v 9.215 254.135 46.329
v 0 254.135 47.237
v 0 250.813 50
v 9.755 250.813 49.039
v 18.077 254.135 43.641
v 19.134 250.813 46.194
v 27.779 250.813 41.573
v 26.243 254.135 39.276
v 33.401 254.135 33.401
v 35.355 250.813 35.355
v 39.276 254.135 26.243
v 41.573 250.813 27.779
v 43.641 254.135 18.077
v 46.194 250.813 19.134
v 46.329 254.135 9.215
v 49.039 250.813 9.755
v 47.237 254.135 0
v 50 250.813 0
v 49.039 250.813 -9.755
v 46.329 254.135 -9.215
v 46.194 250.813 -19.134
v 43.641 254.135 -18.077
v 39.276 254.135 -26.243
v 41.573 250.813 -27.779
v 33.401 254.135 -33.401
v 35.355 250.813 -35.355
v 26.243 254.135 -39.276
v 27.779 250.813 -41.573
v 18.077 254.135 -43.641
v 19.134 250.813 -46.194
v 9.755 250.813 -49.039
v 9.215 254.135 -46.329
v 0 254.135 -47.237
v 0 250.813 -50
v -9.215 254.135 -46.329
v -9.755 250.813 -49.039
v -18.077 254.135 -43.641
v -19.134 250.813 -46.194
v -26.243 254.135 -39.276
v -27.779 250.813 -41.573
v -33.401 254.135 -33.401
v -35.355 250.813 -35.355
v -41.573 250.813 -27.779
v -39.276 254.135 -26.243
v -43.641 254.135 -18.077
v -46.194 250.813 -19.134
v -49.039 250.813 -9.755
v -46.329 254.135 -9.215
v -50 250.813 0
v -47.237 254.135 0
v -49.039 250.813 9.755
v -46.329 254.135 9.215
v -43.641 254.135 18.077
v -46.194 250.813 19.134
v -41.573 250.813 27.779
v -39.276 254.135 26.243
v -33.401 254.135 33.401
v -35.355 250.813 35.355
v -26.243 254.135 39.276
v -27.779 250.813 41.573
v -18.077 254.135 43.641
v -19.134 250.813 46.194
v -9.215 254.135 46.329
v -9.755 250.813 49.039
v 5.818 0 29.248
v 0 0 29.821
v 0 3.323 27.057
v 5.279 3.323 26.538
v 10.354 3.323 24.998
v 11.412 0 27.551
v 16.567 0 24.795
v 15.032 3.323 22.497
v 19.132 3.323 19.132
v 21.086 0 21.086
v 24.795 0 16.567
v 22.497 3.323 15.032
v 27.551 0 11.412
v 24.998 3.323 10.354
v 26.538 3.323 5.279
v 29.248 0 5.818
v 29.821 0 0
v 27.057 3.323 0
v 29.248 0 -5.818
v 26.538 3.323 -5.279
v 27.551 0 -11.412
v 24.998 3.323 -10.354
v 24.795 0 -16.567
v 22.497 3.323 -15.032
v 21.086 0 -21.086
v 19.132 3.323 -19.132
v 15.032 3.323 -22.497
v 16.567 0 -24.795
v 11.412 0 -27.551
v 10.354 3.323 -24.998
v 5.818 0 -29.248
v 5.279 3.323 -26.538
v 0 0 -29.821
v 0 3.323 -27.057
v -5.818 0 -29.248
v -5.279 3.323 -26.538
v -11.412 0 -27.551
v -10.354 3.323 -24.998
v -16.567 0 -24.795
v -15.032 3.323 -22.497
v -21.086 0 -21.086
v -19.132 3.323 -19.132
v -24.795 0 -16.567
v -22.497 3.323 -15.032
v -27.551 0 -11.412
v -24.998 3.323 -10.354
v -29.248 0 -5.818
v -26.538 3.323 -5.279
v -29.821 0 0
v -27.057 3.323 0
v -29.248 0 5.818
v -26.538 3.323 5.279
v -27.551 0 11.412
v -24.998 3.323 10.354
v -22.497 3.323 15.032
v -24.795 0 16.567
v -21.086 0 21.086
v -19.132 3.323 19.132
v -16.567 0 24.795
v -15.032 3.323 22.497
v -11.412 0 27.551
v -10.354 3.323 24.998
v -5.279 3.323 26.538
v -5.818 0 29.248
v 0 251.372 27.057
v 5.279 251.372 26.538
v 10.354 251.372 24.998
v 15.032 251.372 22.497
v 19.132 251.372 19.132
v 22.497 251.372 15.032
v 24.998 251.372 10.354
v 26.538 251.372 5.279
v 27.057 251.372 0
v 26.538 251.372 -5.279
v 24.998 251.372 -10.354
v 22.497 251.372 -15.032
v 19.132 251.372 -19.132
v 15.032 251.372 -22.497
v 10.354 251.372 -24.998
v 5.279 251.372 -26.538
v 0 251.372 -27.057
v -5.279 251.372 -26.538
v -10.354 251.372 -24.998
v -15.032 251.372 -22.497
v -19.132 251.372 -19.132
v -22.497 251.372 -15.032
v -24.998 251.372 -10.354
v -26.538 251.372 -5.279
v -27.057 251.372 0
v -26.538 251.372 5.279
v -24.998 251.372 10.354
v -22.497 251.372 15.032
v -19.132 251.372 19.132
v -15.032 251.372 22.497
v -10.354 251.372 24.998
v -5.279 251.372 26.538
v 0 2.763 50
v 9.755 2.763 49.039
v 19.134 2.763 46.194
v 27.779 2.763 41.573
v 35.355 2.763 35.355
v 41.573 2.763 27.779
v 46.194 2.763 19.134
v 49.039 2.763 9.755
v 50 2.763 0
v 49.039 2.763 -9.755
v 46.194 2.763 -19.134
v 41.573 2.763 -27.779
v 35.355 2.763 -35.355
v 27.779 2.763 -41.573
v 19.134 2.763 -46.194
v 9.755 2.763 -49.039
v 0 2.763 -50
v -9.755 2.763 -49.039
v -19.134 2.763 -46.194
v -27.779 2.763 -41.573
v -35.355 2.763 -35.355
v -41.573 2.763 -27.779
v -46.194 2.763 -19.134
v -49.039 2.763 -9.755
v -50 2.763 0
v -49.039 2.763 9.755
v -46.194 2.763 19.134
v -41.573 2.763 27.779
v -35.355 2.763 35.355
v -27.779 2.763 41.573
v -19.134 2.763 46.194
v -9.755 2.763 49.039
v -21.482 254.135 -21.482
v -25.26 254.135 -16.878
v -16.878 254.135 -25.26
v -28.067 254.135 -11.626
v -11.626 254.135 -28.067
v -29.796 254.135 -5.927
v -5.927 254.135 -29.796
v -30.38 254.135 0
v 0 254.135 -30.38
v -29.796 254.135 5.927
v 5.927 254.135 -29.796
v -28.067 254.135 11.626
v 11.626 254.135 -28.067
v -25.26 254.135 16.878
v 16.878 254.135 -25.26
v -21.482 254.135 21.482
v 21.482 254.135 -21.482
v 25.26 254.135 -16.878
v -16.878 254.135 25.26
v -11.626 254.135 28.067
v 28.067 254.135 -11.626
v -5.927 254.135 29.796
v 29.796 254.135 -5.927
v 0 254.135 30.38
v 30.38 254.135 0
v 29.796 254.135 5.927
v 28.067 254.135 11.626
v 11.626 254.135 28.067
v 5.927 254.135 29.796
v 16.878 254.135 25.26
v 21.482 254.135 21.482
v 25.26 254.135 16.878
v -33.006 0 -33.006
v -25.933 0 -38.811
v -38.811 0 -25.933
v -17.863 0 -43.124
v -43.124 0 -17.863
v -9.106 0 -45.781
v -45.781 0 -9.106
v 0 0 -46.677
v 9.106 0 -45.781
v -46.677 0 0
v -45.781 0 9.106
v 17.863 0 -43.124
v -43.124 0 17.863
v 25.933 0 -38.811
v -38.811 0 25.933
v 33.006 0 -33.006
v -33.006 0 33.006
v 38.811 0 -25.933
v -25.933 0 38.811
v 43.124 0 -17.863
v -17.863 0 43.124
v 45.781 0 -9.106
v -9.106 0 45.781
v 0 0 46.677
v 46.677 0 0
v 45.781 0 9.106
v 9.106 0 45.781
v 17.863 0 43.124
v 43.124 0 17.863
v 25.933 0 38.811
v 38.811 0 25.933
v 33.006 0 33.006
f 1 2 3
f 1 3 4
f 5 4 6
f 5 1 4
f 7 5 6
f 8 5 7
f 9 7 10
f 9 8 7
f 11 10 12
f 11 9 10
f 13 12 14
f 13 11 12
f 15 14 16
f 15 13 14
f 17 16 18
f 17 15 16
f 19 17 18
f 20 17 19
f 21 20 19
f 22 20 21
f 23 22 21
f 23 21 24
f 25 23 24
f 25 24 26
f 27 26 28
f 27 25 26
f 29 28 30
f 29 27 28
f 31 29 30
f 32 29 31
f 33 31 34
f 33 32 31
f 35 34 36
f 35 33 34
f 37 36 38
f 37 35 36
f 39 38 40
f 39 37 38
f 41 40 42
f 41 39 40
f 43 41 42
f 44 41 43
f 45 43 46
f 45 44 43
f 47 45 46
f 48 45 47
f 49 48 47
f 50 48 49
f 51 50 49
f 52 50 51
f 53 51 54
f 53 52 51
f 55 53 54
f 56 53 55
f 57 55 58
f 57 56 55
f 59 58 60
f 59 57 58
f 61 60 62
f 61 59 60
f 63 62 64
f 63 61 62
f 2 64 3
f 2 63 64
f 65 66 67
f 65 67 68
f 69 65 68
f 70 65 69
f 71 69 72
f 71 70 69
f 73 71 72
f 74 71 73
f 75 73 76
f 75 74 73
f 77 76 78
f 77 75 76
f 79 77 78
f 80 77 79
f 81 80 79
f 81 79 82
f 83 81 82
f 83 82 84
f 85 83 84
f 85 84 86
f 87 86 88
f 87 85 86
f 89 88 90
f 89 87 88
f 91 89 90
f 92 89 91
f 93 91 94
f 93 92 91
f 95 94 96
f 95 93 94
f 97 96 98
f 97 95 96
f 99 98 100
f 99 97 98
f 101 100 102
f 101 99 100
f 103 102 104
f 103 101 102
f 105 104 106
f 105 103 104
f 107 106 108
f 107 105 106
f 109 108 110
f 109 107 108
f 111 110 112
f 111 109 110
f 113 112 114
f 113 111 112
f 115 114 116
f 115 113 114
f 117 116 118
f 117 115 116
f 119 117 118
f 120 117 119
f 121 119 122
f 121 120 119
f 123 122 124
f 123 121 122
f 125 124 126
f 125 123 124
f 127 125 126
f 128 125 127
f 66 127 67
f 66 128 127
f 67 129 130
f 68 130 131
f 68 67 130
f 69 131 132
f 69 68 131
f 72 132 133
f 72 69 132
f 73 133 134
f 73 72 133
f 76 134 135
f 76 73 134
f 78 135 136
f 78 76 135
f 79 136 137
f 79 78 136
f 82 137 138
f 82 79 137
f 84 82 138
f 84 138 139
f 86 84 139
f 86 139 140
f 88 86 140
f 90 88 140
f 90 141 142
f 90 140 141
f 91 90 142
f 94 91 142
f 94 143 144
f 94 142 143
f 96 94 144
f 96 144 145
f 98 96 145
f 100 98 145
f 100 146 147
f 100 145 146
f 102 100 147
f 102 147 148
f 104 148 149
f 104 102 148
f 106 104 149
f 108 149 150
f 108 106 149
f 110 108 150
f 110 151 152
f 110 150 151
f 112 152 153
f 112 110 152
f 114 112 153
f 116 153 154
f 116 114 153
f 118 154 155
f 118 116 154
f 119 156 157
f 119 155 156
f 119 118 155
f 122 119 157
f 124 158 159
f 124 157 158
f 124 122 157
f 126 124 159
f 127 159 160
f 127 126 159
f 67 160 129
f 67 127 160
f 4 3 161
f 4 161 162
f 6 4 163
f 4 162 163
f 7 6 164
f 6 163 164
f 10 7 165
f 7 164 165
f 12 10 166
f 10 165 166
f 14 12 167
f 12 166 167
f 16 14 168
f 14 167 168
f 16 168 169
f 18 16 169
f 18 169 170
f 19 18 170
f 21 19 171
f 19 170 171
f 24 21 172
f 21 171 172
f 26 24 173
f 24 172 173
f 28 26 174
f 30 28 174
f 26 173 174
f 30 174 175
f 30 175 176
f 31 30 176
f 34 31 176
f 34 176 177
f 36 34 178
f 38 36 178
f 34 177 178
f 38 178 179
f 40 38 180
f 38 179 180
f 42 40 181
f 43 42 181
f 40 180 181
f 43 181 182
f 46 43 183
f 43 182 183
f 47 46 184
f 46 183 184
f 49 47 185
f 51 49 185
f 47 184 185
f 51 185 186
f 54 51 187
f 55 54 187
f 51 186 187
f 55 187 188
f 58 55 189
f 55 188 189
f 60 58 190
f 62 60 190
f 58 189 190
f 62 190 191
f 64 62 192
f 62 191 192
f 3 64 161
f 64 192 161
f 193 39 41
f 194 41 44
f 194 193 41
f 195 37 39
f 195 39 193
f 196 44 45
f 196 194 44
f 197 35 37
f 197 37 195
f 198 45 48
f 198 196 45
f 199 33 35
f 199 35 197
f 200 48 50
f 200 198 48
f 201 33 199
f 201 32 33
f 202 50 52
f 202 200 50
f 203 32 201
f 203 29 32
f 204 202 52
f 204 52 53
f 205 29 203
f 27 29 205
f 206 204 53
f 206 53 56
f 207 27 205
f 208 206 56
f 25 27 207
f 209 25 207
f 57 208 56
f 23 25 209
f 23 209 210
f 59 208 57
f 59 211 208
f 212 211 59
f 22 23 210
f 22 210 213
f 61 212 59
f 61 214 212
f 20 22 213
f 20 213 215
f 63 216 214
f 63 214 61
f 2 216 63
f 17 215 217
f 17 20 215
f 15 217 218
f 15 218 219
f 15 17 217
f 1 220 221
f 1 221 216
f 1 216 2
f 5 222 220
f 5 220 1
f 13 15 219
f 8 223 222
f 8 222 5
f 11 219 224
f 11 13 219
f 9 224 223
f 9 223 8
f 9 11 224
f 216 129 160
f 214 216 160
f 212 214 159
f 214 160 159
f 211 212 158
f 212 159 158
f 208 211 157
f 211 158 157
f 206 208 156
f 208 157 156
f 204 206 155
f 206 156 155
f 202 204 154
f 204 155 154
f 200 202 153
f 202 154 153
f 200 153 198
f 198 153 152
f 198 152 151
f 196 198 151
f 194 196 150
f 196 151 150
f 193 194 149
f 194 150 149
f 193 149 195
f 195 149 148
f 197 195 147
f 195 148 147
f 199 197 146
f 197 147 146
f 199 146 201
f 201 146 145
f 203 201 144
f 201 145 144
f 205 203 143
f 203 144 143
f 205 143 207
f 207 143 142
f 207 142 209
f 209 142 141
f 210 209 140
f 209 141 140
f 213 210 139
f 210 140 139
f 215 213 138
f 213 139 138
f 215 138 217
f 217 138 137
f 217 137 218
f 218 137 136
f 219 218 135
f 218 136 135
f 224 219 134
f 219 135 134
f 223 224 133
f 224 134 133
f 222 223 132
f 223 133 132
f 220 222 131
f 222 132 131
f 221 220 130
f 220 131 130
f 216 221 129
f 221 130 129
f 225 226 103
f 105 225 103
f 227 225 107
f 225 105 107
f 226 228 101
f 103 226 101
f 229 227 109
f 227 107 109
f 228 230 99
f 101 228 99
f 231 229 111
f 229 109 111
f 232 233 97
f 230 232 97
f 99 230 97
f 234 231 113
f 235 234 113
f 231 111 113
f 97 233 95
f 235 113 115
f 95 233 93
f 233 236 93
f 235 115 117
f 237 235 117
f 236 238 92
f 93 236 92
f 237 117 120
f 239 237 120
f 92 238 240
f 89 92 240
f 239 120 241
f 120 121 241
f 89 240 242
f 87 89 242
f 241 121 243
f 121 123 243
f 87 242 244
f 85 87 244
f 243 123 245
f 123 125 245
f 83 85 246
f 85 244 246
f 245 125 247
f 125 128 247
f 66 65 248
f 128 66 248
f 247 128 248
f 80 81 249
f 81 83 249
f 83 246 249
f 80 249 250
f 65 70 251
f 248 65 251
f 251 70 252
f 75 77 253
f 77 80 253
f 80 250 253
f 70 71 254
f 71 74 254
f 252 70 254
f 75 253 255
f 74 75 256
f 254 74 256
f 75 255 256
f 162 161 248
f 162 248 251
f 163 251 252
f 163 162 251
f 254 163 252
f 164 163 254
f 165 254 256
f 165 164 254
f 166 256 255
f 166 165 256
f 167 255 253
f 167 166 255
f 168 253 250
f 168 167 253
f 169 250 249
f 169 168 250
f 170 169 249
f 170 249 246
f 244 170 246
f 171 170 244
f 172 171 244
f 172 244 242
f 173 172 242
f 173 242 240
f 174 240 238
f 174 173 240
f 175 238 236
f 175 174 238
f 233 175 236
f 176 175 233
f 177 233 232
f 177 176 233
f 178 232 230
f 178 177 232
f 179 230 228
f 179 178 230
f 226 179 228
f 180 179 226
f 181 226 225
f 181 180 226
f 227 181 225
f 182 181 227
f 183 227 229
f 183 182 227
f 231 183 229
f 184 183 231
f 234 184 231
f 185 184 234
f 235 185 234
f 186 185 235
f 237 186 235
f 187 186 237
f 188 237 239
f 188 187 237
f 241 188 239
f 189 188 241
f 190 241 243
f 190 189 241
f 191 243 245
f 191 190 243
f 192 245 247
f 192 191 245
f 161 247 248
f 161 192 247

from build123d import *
from OCP.BRepFilletAPI import BRepFilletAPI_MakeChamfer

# Parameters (mm, degrees)
SKETCH1_R           = 50
BOSS_EXTRUDE1_DEPTH = 254.135357599
SKETCH2_R           = 27.057401957
CUT_EXTRUDE1_DEPTH  = 264.789271924
CHAMFER1_SIZE       = 3.32250432
CHAMFER1_SIZE2      = 2.763298706


with BuildPart() as part:
    # Sketch1 → Boss-Extrude1 (new body)
    with BuildSketch(Plane(origin=(0, 0, 0), x_dir=(1, 0, 0), z_dir=(0, 1, 0))):
        Circle(SKETCH1_R)
    extrude(amount=BOSS_EXTRUDE1_DEPTH)

    # Sketch2 → Cut-Extrude1 (cut, through all)
    with BuildSketch(Plane(origin=(0, 0, 0), x_dir=(1, 0, 0), z_dir=(0, 1, 0))):
        Circle(SKETCH2_R)
    extrude(amount=CUT_EXTRUDE1_DEPTH, mode=Mode.SUBTRACT)

    # Chamfer1: one chamfer whose edges measure the first distance from different faces: ONE call of the kernel's chamfer builder (chamfer() names one face for all edges)
    chamfer1_edges_1 = [part.edges().sort_by_distance(p)[0] for p in [
        (-27.057401957, 254.135357599, 0),
    ]]
    chamfer1_side_1 = [part.faces().sort_by_distance(p)[0] for p in [
        (-48.585786438, 254.135357599, 0),
    ]]
    chamfer1_edges_2 = [part.edges().sort_by_distance(p)[0] for p in [
        (-27.057401957, 0, 0),
    ]]
    chamfer1_side_2 = [part.faces().sort_by_distance(p)[0] for p in [
        (-27.057401957, 127.0676788, 0),
    ]]
    chamfer1_edges_3 = [part.edges().sort_by_distance(p)[0] for p in [
        (-50, 0, 0),
    ]]
    chamfer1_side_3 = [part.faces().sort_by_distance(p)[0] for p in [
        (-48.585786438, 0, 0),
    ]]
    chamfer1_edges_4 = [part.edges().sort_by_distance(p)[0] for p in [
        (-50, 254.135357599, 0),
    ]]
    chamfer1_side_4 = [part.faces().sort_by_distance(p)[0] for p in [
        (-50, 127.0676788, 0),
    ]]
    chamfer1 = BRepFilletAPI_MakeChamfer(part.part.solid().wrapped)
    for e in chamfer1_edges_1:
        chamfer1.Add(CHAMFER1_SIZE, CHAMFER1_SIZE2, e.wrapped, chamfer1_side_1[0].wrapped)  # the first distance lies on this face
    for e in chamfer1_edges_2:
        chamfer1.Add(CHAMFER1_SIZE, CHAMFER1_SIZE2, e.wrapped, chamfer1_side_2[0].wrapped)  # the first distance lies on this face
    for e in chamfer1_edges_3:
        chamfer1.Add(CHAMFER1_SIZE, CHAMFER1_SIZE2, e.wrapped, chamfer1_side_3[0].wrapped)  # the first distance lies on this face
    for e in chamfer1_edges_4:
        chamfer1.Add(CHAMFER1_SIZE, CHAMFER1_SIZE2, e.wrapped, chamfer1_side_4[0].wrapped)  # the first distance lies on this face
    add(Compound.cast(chamfer1.Shape()), mode=Mode.REPLACE)


solid = part.part
